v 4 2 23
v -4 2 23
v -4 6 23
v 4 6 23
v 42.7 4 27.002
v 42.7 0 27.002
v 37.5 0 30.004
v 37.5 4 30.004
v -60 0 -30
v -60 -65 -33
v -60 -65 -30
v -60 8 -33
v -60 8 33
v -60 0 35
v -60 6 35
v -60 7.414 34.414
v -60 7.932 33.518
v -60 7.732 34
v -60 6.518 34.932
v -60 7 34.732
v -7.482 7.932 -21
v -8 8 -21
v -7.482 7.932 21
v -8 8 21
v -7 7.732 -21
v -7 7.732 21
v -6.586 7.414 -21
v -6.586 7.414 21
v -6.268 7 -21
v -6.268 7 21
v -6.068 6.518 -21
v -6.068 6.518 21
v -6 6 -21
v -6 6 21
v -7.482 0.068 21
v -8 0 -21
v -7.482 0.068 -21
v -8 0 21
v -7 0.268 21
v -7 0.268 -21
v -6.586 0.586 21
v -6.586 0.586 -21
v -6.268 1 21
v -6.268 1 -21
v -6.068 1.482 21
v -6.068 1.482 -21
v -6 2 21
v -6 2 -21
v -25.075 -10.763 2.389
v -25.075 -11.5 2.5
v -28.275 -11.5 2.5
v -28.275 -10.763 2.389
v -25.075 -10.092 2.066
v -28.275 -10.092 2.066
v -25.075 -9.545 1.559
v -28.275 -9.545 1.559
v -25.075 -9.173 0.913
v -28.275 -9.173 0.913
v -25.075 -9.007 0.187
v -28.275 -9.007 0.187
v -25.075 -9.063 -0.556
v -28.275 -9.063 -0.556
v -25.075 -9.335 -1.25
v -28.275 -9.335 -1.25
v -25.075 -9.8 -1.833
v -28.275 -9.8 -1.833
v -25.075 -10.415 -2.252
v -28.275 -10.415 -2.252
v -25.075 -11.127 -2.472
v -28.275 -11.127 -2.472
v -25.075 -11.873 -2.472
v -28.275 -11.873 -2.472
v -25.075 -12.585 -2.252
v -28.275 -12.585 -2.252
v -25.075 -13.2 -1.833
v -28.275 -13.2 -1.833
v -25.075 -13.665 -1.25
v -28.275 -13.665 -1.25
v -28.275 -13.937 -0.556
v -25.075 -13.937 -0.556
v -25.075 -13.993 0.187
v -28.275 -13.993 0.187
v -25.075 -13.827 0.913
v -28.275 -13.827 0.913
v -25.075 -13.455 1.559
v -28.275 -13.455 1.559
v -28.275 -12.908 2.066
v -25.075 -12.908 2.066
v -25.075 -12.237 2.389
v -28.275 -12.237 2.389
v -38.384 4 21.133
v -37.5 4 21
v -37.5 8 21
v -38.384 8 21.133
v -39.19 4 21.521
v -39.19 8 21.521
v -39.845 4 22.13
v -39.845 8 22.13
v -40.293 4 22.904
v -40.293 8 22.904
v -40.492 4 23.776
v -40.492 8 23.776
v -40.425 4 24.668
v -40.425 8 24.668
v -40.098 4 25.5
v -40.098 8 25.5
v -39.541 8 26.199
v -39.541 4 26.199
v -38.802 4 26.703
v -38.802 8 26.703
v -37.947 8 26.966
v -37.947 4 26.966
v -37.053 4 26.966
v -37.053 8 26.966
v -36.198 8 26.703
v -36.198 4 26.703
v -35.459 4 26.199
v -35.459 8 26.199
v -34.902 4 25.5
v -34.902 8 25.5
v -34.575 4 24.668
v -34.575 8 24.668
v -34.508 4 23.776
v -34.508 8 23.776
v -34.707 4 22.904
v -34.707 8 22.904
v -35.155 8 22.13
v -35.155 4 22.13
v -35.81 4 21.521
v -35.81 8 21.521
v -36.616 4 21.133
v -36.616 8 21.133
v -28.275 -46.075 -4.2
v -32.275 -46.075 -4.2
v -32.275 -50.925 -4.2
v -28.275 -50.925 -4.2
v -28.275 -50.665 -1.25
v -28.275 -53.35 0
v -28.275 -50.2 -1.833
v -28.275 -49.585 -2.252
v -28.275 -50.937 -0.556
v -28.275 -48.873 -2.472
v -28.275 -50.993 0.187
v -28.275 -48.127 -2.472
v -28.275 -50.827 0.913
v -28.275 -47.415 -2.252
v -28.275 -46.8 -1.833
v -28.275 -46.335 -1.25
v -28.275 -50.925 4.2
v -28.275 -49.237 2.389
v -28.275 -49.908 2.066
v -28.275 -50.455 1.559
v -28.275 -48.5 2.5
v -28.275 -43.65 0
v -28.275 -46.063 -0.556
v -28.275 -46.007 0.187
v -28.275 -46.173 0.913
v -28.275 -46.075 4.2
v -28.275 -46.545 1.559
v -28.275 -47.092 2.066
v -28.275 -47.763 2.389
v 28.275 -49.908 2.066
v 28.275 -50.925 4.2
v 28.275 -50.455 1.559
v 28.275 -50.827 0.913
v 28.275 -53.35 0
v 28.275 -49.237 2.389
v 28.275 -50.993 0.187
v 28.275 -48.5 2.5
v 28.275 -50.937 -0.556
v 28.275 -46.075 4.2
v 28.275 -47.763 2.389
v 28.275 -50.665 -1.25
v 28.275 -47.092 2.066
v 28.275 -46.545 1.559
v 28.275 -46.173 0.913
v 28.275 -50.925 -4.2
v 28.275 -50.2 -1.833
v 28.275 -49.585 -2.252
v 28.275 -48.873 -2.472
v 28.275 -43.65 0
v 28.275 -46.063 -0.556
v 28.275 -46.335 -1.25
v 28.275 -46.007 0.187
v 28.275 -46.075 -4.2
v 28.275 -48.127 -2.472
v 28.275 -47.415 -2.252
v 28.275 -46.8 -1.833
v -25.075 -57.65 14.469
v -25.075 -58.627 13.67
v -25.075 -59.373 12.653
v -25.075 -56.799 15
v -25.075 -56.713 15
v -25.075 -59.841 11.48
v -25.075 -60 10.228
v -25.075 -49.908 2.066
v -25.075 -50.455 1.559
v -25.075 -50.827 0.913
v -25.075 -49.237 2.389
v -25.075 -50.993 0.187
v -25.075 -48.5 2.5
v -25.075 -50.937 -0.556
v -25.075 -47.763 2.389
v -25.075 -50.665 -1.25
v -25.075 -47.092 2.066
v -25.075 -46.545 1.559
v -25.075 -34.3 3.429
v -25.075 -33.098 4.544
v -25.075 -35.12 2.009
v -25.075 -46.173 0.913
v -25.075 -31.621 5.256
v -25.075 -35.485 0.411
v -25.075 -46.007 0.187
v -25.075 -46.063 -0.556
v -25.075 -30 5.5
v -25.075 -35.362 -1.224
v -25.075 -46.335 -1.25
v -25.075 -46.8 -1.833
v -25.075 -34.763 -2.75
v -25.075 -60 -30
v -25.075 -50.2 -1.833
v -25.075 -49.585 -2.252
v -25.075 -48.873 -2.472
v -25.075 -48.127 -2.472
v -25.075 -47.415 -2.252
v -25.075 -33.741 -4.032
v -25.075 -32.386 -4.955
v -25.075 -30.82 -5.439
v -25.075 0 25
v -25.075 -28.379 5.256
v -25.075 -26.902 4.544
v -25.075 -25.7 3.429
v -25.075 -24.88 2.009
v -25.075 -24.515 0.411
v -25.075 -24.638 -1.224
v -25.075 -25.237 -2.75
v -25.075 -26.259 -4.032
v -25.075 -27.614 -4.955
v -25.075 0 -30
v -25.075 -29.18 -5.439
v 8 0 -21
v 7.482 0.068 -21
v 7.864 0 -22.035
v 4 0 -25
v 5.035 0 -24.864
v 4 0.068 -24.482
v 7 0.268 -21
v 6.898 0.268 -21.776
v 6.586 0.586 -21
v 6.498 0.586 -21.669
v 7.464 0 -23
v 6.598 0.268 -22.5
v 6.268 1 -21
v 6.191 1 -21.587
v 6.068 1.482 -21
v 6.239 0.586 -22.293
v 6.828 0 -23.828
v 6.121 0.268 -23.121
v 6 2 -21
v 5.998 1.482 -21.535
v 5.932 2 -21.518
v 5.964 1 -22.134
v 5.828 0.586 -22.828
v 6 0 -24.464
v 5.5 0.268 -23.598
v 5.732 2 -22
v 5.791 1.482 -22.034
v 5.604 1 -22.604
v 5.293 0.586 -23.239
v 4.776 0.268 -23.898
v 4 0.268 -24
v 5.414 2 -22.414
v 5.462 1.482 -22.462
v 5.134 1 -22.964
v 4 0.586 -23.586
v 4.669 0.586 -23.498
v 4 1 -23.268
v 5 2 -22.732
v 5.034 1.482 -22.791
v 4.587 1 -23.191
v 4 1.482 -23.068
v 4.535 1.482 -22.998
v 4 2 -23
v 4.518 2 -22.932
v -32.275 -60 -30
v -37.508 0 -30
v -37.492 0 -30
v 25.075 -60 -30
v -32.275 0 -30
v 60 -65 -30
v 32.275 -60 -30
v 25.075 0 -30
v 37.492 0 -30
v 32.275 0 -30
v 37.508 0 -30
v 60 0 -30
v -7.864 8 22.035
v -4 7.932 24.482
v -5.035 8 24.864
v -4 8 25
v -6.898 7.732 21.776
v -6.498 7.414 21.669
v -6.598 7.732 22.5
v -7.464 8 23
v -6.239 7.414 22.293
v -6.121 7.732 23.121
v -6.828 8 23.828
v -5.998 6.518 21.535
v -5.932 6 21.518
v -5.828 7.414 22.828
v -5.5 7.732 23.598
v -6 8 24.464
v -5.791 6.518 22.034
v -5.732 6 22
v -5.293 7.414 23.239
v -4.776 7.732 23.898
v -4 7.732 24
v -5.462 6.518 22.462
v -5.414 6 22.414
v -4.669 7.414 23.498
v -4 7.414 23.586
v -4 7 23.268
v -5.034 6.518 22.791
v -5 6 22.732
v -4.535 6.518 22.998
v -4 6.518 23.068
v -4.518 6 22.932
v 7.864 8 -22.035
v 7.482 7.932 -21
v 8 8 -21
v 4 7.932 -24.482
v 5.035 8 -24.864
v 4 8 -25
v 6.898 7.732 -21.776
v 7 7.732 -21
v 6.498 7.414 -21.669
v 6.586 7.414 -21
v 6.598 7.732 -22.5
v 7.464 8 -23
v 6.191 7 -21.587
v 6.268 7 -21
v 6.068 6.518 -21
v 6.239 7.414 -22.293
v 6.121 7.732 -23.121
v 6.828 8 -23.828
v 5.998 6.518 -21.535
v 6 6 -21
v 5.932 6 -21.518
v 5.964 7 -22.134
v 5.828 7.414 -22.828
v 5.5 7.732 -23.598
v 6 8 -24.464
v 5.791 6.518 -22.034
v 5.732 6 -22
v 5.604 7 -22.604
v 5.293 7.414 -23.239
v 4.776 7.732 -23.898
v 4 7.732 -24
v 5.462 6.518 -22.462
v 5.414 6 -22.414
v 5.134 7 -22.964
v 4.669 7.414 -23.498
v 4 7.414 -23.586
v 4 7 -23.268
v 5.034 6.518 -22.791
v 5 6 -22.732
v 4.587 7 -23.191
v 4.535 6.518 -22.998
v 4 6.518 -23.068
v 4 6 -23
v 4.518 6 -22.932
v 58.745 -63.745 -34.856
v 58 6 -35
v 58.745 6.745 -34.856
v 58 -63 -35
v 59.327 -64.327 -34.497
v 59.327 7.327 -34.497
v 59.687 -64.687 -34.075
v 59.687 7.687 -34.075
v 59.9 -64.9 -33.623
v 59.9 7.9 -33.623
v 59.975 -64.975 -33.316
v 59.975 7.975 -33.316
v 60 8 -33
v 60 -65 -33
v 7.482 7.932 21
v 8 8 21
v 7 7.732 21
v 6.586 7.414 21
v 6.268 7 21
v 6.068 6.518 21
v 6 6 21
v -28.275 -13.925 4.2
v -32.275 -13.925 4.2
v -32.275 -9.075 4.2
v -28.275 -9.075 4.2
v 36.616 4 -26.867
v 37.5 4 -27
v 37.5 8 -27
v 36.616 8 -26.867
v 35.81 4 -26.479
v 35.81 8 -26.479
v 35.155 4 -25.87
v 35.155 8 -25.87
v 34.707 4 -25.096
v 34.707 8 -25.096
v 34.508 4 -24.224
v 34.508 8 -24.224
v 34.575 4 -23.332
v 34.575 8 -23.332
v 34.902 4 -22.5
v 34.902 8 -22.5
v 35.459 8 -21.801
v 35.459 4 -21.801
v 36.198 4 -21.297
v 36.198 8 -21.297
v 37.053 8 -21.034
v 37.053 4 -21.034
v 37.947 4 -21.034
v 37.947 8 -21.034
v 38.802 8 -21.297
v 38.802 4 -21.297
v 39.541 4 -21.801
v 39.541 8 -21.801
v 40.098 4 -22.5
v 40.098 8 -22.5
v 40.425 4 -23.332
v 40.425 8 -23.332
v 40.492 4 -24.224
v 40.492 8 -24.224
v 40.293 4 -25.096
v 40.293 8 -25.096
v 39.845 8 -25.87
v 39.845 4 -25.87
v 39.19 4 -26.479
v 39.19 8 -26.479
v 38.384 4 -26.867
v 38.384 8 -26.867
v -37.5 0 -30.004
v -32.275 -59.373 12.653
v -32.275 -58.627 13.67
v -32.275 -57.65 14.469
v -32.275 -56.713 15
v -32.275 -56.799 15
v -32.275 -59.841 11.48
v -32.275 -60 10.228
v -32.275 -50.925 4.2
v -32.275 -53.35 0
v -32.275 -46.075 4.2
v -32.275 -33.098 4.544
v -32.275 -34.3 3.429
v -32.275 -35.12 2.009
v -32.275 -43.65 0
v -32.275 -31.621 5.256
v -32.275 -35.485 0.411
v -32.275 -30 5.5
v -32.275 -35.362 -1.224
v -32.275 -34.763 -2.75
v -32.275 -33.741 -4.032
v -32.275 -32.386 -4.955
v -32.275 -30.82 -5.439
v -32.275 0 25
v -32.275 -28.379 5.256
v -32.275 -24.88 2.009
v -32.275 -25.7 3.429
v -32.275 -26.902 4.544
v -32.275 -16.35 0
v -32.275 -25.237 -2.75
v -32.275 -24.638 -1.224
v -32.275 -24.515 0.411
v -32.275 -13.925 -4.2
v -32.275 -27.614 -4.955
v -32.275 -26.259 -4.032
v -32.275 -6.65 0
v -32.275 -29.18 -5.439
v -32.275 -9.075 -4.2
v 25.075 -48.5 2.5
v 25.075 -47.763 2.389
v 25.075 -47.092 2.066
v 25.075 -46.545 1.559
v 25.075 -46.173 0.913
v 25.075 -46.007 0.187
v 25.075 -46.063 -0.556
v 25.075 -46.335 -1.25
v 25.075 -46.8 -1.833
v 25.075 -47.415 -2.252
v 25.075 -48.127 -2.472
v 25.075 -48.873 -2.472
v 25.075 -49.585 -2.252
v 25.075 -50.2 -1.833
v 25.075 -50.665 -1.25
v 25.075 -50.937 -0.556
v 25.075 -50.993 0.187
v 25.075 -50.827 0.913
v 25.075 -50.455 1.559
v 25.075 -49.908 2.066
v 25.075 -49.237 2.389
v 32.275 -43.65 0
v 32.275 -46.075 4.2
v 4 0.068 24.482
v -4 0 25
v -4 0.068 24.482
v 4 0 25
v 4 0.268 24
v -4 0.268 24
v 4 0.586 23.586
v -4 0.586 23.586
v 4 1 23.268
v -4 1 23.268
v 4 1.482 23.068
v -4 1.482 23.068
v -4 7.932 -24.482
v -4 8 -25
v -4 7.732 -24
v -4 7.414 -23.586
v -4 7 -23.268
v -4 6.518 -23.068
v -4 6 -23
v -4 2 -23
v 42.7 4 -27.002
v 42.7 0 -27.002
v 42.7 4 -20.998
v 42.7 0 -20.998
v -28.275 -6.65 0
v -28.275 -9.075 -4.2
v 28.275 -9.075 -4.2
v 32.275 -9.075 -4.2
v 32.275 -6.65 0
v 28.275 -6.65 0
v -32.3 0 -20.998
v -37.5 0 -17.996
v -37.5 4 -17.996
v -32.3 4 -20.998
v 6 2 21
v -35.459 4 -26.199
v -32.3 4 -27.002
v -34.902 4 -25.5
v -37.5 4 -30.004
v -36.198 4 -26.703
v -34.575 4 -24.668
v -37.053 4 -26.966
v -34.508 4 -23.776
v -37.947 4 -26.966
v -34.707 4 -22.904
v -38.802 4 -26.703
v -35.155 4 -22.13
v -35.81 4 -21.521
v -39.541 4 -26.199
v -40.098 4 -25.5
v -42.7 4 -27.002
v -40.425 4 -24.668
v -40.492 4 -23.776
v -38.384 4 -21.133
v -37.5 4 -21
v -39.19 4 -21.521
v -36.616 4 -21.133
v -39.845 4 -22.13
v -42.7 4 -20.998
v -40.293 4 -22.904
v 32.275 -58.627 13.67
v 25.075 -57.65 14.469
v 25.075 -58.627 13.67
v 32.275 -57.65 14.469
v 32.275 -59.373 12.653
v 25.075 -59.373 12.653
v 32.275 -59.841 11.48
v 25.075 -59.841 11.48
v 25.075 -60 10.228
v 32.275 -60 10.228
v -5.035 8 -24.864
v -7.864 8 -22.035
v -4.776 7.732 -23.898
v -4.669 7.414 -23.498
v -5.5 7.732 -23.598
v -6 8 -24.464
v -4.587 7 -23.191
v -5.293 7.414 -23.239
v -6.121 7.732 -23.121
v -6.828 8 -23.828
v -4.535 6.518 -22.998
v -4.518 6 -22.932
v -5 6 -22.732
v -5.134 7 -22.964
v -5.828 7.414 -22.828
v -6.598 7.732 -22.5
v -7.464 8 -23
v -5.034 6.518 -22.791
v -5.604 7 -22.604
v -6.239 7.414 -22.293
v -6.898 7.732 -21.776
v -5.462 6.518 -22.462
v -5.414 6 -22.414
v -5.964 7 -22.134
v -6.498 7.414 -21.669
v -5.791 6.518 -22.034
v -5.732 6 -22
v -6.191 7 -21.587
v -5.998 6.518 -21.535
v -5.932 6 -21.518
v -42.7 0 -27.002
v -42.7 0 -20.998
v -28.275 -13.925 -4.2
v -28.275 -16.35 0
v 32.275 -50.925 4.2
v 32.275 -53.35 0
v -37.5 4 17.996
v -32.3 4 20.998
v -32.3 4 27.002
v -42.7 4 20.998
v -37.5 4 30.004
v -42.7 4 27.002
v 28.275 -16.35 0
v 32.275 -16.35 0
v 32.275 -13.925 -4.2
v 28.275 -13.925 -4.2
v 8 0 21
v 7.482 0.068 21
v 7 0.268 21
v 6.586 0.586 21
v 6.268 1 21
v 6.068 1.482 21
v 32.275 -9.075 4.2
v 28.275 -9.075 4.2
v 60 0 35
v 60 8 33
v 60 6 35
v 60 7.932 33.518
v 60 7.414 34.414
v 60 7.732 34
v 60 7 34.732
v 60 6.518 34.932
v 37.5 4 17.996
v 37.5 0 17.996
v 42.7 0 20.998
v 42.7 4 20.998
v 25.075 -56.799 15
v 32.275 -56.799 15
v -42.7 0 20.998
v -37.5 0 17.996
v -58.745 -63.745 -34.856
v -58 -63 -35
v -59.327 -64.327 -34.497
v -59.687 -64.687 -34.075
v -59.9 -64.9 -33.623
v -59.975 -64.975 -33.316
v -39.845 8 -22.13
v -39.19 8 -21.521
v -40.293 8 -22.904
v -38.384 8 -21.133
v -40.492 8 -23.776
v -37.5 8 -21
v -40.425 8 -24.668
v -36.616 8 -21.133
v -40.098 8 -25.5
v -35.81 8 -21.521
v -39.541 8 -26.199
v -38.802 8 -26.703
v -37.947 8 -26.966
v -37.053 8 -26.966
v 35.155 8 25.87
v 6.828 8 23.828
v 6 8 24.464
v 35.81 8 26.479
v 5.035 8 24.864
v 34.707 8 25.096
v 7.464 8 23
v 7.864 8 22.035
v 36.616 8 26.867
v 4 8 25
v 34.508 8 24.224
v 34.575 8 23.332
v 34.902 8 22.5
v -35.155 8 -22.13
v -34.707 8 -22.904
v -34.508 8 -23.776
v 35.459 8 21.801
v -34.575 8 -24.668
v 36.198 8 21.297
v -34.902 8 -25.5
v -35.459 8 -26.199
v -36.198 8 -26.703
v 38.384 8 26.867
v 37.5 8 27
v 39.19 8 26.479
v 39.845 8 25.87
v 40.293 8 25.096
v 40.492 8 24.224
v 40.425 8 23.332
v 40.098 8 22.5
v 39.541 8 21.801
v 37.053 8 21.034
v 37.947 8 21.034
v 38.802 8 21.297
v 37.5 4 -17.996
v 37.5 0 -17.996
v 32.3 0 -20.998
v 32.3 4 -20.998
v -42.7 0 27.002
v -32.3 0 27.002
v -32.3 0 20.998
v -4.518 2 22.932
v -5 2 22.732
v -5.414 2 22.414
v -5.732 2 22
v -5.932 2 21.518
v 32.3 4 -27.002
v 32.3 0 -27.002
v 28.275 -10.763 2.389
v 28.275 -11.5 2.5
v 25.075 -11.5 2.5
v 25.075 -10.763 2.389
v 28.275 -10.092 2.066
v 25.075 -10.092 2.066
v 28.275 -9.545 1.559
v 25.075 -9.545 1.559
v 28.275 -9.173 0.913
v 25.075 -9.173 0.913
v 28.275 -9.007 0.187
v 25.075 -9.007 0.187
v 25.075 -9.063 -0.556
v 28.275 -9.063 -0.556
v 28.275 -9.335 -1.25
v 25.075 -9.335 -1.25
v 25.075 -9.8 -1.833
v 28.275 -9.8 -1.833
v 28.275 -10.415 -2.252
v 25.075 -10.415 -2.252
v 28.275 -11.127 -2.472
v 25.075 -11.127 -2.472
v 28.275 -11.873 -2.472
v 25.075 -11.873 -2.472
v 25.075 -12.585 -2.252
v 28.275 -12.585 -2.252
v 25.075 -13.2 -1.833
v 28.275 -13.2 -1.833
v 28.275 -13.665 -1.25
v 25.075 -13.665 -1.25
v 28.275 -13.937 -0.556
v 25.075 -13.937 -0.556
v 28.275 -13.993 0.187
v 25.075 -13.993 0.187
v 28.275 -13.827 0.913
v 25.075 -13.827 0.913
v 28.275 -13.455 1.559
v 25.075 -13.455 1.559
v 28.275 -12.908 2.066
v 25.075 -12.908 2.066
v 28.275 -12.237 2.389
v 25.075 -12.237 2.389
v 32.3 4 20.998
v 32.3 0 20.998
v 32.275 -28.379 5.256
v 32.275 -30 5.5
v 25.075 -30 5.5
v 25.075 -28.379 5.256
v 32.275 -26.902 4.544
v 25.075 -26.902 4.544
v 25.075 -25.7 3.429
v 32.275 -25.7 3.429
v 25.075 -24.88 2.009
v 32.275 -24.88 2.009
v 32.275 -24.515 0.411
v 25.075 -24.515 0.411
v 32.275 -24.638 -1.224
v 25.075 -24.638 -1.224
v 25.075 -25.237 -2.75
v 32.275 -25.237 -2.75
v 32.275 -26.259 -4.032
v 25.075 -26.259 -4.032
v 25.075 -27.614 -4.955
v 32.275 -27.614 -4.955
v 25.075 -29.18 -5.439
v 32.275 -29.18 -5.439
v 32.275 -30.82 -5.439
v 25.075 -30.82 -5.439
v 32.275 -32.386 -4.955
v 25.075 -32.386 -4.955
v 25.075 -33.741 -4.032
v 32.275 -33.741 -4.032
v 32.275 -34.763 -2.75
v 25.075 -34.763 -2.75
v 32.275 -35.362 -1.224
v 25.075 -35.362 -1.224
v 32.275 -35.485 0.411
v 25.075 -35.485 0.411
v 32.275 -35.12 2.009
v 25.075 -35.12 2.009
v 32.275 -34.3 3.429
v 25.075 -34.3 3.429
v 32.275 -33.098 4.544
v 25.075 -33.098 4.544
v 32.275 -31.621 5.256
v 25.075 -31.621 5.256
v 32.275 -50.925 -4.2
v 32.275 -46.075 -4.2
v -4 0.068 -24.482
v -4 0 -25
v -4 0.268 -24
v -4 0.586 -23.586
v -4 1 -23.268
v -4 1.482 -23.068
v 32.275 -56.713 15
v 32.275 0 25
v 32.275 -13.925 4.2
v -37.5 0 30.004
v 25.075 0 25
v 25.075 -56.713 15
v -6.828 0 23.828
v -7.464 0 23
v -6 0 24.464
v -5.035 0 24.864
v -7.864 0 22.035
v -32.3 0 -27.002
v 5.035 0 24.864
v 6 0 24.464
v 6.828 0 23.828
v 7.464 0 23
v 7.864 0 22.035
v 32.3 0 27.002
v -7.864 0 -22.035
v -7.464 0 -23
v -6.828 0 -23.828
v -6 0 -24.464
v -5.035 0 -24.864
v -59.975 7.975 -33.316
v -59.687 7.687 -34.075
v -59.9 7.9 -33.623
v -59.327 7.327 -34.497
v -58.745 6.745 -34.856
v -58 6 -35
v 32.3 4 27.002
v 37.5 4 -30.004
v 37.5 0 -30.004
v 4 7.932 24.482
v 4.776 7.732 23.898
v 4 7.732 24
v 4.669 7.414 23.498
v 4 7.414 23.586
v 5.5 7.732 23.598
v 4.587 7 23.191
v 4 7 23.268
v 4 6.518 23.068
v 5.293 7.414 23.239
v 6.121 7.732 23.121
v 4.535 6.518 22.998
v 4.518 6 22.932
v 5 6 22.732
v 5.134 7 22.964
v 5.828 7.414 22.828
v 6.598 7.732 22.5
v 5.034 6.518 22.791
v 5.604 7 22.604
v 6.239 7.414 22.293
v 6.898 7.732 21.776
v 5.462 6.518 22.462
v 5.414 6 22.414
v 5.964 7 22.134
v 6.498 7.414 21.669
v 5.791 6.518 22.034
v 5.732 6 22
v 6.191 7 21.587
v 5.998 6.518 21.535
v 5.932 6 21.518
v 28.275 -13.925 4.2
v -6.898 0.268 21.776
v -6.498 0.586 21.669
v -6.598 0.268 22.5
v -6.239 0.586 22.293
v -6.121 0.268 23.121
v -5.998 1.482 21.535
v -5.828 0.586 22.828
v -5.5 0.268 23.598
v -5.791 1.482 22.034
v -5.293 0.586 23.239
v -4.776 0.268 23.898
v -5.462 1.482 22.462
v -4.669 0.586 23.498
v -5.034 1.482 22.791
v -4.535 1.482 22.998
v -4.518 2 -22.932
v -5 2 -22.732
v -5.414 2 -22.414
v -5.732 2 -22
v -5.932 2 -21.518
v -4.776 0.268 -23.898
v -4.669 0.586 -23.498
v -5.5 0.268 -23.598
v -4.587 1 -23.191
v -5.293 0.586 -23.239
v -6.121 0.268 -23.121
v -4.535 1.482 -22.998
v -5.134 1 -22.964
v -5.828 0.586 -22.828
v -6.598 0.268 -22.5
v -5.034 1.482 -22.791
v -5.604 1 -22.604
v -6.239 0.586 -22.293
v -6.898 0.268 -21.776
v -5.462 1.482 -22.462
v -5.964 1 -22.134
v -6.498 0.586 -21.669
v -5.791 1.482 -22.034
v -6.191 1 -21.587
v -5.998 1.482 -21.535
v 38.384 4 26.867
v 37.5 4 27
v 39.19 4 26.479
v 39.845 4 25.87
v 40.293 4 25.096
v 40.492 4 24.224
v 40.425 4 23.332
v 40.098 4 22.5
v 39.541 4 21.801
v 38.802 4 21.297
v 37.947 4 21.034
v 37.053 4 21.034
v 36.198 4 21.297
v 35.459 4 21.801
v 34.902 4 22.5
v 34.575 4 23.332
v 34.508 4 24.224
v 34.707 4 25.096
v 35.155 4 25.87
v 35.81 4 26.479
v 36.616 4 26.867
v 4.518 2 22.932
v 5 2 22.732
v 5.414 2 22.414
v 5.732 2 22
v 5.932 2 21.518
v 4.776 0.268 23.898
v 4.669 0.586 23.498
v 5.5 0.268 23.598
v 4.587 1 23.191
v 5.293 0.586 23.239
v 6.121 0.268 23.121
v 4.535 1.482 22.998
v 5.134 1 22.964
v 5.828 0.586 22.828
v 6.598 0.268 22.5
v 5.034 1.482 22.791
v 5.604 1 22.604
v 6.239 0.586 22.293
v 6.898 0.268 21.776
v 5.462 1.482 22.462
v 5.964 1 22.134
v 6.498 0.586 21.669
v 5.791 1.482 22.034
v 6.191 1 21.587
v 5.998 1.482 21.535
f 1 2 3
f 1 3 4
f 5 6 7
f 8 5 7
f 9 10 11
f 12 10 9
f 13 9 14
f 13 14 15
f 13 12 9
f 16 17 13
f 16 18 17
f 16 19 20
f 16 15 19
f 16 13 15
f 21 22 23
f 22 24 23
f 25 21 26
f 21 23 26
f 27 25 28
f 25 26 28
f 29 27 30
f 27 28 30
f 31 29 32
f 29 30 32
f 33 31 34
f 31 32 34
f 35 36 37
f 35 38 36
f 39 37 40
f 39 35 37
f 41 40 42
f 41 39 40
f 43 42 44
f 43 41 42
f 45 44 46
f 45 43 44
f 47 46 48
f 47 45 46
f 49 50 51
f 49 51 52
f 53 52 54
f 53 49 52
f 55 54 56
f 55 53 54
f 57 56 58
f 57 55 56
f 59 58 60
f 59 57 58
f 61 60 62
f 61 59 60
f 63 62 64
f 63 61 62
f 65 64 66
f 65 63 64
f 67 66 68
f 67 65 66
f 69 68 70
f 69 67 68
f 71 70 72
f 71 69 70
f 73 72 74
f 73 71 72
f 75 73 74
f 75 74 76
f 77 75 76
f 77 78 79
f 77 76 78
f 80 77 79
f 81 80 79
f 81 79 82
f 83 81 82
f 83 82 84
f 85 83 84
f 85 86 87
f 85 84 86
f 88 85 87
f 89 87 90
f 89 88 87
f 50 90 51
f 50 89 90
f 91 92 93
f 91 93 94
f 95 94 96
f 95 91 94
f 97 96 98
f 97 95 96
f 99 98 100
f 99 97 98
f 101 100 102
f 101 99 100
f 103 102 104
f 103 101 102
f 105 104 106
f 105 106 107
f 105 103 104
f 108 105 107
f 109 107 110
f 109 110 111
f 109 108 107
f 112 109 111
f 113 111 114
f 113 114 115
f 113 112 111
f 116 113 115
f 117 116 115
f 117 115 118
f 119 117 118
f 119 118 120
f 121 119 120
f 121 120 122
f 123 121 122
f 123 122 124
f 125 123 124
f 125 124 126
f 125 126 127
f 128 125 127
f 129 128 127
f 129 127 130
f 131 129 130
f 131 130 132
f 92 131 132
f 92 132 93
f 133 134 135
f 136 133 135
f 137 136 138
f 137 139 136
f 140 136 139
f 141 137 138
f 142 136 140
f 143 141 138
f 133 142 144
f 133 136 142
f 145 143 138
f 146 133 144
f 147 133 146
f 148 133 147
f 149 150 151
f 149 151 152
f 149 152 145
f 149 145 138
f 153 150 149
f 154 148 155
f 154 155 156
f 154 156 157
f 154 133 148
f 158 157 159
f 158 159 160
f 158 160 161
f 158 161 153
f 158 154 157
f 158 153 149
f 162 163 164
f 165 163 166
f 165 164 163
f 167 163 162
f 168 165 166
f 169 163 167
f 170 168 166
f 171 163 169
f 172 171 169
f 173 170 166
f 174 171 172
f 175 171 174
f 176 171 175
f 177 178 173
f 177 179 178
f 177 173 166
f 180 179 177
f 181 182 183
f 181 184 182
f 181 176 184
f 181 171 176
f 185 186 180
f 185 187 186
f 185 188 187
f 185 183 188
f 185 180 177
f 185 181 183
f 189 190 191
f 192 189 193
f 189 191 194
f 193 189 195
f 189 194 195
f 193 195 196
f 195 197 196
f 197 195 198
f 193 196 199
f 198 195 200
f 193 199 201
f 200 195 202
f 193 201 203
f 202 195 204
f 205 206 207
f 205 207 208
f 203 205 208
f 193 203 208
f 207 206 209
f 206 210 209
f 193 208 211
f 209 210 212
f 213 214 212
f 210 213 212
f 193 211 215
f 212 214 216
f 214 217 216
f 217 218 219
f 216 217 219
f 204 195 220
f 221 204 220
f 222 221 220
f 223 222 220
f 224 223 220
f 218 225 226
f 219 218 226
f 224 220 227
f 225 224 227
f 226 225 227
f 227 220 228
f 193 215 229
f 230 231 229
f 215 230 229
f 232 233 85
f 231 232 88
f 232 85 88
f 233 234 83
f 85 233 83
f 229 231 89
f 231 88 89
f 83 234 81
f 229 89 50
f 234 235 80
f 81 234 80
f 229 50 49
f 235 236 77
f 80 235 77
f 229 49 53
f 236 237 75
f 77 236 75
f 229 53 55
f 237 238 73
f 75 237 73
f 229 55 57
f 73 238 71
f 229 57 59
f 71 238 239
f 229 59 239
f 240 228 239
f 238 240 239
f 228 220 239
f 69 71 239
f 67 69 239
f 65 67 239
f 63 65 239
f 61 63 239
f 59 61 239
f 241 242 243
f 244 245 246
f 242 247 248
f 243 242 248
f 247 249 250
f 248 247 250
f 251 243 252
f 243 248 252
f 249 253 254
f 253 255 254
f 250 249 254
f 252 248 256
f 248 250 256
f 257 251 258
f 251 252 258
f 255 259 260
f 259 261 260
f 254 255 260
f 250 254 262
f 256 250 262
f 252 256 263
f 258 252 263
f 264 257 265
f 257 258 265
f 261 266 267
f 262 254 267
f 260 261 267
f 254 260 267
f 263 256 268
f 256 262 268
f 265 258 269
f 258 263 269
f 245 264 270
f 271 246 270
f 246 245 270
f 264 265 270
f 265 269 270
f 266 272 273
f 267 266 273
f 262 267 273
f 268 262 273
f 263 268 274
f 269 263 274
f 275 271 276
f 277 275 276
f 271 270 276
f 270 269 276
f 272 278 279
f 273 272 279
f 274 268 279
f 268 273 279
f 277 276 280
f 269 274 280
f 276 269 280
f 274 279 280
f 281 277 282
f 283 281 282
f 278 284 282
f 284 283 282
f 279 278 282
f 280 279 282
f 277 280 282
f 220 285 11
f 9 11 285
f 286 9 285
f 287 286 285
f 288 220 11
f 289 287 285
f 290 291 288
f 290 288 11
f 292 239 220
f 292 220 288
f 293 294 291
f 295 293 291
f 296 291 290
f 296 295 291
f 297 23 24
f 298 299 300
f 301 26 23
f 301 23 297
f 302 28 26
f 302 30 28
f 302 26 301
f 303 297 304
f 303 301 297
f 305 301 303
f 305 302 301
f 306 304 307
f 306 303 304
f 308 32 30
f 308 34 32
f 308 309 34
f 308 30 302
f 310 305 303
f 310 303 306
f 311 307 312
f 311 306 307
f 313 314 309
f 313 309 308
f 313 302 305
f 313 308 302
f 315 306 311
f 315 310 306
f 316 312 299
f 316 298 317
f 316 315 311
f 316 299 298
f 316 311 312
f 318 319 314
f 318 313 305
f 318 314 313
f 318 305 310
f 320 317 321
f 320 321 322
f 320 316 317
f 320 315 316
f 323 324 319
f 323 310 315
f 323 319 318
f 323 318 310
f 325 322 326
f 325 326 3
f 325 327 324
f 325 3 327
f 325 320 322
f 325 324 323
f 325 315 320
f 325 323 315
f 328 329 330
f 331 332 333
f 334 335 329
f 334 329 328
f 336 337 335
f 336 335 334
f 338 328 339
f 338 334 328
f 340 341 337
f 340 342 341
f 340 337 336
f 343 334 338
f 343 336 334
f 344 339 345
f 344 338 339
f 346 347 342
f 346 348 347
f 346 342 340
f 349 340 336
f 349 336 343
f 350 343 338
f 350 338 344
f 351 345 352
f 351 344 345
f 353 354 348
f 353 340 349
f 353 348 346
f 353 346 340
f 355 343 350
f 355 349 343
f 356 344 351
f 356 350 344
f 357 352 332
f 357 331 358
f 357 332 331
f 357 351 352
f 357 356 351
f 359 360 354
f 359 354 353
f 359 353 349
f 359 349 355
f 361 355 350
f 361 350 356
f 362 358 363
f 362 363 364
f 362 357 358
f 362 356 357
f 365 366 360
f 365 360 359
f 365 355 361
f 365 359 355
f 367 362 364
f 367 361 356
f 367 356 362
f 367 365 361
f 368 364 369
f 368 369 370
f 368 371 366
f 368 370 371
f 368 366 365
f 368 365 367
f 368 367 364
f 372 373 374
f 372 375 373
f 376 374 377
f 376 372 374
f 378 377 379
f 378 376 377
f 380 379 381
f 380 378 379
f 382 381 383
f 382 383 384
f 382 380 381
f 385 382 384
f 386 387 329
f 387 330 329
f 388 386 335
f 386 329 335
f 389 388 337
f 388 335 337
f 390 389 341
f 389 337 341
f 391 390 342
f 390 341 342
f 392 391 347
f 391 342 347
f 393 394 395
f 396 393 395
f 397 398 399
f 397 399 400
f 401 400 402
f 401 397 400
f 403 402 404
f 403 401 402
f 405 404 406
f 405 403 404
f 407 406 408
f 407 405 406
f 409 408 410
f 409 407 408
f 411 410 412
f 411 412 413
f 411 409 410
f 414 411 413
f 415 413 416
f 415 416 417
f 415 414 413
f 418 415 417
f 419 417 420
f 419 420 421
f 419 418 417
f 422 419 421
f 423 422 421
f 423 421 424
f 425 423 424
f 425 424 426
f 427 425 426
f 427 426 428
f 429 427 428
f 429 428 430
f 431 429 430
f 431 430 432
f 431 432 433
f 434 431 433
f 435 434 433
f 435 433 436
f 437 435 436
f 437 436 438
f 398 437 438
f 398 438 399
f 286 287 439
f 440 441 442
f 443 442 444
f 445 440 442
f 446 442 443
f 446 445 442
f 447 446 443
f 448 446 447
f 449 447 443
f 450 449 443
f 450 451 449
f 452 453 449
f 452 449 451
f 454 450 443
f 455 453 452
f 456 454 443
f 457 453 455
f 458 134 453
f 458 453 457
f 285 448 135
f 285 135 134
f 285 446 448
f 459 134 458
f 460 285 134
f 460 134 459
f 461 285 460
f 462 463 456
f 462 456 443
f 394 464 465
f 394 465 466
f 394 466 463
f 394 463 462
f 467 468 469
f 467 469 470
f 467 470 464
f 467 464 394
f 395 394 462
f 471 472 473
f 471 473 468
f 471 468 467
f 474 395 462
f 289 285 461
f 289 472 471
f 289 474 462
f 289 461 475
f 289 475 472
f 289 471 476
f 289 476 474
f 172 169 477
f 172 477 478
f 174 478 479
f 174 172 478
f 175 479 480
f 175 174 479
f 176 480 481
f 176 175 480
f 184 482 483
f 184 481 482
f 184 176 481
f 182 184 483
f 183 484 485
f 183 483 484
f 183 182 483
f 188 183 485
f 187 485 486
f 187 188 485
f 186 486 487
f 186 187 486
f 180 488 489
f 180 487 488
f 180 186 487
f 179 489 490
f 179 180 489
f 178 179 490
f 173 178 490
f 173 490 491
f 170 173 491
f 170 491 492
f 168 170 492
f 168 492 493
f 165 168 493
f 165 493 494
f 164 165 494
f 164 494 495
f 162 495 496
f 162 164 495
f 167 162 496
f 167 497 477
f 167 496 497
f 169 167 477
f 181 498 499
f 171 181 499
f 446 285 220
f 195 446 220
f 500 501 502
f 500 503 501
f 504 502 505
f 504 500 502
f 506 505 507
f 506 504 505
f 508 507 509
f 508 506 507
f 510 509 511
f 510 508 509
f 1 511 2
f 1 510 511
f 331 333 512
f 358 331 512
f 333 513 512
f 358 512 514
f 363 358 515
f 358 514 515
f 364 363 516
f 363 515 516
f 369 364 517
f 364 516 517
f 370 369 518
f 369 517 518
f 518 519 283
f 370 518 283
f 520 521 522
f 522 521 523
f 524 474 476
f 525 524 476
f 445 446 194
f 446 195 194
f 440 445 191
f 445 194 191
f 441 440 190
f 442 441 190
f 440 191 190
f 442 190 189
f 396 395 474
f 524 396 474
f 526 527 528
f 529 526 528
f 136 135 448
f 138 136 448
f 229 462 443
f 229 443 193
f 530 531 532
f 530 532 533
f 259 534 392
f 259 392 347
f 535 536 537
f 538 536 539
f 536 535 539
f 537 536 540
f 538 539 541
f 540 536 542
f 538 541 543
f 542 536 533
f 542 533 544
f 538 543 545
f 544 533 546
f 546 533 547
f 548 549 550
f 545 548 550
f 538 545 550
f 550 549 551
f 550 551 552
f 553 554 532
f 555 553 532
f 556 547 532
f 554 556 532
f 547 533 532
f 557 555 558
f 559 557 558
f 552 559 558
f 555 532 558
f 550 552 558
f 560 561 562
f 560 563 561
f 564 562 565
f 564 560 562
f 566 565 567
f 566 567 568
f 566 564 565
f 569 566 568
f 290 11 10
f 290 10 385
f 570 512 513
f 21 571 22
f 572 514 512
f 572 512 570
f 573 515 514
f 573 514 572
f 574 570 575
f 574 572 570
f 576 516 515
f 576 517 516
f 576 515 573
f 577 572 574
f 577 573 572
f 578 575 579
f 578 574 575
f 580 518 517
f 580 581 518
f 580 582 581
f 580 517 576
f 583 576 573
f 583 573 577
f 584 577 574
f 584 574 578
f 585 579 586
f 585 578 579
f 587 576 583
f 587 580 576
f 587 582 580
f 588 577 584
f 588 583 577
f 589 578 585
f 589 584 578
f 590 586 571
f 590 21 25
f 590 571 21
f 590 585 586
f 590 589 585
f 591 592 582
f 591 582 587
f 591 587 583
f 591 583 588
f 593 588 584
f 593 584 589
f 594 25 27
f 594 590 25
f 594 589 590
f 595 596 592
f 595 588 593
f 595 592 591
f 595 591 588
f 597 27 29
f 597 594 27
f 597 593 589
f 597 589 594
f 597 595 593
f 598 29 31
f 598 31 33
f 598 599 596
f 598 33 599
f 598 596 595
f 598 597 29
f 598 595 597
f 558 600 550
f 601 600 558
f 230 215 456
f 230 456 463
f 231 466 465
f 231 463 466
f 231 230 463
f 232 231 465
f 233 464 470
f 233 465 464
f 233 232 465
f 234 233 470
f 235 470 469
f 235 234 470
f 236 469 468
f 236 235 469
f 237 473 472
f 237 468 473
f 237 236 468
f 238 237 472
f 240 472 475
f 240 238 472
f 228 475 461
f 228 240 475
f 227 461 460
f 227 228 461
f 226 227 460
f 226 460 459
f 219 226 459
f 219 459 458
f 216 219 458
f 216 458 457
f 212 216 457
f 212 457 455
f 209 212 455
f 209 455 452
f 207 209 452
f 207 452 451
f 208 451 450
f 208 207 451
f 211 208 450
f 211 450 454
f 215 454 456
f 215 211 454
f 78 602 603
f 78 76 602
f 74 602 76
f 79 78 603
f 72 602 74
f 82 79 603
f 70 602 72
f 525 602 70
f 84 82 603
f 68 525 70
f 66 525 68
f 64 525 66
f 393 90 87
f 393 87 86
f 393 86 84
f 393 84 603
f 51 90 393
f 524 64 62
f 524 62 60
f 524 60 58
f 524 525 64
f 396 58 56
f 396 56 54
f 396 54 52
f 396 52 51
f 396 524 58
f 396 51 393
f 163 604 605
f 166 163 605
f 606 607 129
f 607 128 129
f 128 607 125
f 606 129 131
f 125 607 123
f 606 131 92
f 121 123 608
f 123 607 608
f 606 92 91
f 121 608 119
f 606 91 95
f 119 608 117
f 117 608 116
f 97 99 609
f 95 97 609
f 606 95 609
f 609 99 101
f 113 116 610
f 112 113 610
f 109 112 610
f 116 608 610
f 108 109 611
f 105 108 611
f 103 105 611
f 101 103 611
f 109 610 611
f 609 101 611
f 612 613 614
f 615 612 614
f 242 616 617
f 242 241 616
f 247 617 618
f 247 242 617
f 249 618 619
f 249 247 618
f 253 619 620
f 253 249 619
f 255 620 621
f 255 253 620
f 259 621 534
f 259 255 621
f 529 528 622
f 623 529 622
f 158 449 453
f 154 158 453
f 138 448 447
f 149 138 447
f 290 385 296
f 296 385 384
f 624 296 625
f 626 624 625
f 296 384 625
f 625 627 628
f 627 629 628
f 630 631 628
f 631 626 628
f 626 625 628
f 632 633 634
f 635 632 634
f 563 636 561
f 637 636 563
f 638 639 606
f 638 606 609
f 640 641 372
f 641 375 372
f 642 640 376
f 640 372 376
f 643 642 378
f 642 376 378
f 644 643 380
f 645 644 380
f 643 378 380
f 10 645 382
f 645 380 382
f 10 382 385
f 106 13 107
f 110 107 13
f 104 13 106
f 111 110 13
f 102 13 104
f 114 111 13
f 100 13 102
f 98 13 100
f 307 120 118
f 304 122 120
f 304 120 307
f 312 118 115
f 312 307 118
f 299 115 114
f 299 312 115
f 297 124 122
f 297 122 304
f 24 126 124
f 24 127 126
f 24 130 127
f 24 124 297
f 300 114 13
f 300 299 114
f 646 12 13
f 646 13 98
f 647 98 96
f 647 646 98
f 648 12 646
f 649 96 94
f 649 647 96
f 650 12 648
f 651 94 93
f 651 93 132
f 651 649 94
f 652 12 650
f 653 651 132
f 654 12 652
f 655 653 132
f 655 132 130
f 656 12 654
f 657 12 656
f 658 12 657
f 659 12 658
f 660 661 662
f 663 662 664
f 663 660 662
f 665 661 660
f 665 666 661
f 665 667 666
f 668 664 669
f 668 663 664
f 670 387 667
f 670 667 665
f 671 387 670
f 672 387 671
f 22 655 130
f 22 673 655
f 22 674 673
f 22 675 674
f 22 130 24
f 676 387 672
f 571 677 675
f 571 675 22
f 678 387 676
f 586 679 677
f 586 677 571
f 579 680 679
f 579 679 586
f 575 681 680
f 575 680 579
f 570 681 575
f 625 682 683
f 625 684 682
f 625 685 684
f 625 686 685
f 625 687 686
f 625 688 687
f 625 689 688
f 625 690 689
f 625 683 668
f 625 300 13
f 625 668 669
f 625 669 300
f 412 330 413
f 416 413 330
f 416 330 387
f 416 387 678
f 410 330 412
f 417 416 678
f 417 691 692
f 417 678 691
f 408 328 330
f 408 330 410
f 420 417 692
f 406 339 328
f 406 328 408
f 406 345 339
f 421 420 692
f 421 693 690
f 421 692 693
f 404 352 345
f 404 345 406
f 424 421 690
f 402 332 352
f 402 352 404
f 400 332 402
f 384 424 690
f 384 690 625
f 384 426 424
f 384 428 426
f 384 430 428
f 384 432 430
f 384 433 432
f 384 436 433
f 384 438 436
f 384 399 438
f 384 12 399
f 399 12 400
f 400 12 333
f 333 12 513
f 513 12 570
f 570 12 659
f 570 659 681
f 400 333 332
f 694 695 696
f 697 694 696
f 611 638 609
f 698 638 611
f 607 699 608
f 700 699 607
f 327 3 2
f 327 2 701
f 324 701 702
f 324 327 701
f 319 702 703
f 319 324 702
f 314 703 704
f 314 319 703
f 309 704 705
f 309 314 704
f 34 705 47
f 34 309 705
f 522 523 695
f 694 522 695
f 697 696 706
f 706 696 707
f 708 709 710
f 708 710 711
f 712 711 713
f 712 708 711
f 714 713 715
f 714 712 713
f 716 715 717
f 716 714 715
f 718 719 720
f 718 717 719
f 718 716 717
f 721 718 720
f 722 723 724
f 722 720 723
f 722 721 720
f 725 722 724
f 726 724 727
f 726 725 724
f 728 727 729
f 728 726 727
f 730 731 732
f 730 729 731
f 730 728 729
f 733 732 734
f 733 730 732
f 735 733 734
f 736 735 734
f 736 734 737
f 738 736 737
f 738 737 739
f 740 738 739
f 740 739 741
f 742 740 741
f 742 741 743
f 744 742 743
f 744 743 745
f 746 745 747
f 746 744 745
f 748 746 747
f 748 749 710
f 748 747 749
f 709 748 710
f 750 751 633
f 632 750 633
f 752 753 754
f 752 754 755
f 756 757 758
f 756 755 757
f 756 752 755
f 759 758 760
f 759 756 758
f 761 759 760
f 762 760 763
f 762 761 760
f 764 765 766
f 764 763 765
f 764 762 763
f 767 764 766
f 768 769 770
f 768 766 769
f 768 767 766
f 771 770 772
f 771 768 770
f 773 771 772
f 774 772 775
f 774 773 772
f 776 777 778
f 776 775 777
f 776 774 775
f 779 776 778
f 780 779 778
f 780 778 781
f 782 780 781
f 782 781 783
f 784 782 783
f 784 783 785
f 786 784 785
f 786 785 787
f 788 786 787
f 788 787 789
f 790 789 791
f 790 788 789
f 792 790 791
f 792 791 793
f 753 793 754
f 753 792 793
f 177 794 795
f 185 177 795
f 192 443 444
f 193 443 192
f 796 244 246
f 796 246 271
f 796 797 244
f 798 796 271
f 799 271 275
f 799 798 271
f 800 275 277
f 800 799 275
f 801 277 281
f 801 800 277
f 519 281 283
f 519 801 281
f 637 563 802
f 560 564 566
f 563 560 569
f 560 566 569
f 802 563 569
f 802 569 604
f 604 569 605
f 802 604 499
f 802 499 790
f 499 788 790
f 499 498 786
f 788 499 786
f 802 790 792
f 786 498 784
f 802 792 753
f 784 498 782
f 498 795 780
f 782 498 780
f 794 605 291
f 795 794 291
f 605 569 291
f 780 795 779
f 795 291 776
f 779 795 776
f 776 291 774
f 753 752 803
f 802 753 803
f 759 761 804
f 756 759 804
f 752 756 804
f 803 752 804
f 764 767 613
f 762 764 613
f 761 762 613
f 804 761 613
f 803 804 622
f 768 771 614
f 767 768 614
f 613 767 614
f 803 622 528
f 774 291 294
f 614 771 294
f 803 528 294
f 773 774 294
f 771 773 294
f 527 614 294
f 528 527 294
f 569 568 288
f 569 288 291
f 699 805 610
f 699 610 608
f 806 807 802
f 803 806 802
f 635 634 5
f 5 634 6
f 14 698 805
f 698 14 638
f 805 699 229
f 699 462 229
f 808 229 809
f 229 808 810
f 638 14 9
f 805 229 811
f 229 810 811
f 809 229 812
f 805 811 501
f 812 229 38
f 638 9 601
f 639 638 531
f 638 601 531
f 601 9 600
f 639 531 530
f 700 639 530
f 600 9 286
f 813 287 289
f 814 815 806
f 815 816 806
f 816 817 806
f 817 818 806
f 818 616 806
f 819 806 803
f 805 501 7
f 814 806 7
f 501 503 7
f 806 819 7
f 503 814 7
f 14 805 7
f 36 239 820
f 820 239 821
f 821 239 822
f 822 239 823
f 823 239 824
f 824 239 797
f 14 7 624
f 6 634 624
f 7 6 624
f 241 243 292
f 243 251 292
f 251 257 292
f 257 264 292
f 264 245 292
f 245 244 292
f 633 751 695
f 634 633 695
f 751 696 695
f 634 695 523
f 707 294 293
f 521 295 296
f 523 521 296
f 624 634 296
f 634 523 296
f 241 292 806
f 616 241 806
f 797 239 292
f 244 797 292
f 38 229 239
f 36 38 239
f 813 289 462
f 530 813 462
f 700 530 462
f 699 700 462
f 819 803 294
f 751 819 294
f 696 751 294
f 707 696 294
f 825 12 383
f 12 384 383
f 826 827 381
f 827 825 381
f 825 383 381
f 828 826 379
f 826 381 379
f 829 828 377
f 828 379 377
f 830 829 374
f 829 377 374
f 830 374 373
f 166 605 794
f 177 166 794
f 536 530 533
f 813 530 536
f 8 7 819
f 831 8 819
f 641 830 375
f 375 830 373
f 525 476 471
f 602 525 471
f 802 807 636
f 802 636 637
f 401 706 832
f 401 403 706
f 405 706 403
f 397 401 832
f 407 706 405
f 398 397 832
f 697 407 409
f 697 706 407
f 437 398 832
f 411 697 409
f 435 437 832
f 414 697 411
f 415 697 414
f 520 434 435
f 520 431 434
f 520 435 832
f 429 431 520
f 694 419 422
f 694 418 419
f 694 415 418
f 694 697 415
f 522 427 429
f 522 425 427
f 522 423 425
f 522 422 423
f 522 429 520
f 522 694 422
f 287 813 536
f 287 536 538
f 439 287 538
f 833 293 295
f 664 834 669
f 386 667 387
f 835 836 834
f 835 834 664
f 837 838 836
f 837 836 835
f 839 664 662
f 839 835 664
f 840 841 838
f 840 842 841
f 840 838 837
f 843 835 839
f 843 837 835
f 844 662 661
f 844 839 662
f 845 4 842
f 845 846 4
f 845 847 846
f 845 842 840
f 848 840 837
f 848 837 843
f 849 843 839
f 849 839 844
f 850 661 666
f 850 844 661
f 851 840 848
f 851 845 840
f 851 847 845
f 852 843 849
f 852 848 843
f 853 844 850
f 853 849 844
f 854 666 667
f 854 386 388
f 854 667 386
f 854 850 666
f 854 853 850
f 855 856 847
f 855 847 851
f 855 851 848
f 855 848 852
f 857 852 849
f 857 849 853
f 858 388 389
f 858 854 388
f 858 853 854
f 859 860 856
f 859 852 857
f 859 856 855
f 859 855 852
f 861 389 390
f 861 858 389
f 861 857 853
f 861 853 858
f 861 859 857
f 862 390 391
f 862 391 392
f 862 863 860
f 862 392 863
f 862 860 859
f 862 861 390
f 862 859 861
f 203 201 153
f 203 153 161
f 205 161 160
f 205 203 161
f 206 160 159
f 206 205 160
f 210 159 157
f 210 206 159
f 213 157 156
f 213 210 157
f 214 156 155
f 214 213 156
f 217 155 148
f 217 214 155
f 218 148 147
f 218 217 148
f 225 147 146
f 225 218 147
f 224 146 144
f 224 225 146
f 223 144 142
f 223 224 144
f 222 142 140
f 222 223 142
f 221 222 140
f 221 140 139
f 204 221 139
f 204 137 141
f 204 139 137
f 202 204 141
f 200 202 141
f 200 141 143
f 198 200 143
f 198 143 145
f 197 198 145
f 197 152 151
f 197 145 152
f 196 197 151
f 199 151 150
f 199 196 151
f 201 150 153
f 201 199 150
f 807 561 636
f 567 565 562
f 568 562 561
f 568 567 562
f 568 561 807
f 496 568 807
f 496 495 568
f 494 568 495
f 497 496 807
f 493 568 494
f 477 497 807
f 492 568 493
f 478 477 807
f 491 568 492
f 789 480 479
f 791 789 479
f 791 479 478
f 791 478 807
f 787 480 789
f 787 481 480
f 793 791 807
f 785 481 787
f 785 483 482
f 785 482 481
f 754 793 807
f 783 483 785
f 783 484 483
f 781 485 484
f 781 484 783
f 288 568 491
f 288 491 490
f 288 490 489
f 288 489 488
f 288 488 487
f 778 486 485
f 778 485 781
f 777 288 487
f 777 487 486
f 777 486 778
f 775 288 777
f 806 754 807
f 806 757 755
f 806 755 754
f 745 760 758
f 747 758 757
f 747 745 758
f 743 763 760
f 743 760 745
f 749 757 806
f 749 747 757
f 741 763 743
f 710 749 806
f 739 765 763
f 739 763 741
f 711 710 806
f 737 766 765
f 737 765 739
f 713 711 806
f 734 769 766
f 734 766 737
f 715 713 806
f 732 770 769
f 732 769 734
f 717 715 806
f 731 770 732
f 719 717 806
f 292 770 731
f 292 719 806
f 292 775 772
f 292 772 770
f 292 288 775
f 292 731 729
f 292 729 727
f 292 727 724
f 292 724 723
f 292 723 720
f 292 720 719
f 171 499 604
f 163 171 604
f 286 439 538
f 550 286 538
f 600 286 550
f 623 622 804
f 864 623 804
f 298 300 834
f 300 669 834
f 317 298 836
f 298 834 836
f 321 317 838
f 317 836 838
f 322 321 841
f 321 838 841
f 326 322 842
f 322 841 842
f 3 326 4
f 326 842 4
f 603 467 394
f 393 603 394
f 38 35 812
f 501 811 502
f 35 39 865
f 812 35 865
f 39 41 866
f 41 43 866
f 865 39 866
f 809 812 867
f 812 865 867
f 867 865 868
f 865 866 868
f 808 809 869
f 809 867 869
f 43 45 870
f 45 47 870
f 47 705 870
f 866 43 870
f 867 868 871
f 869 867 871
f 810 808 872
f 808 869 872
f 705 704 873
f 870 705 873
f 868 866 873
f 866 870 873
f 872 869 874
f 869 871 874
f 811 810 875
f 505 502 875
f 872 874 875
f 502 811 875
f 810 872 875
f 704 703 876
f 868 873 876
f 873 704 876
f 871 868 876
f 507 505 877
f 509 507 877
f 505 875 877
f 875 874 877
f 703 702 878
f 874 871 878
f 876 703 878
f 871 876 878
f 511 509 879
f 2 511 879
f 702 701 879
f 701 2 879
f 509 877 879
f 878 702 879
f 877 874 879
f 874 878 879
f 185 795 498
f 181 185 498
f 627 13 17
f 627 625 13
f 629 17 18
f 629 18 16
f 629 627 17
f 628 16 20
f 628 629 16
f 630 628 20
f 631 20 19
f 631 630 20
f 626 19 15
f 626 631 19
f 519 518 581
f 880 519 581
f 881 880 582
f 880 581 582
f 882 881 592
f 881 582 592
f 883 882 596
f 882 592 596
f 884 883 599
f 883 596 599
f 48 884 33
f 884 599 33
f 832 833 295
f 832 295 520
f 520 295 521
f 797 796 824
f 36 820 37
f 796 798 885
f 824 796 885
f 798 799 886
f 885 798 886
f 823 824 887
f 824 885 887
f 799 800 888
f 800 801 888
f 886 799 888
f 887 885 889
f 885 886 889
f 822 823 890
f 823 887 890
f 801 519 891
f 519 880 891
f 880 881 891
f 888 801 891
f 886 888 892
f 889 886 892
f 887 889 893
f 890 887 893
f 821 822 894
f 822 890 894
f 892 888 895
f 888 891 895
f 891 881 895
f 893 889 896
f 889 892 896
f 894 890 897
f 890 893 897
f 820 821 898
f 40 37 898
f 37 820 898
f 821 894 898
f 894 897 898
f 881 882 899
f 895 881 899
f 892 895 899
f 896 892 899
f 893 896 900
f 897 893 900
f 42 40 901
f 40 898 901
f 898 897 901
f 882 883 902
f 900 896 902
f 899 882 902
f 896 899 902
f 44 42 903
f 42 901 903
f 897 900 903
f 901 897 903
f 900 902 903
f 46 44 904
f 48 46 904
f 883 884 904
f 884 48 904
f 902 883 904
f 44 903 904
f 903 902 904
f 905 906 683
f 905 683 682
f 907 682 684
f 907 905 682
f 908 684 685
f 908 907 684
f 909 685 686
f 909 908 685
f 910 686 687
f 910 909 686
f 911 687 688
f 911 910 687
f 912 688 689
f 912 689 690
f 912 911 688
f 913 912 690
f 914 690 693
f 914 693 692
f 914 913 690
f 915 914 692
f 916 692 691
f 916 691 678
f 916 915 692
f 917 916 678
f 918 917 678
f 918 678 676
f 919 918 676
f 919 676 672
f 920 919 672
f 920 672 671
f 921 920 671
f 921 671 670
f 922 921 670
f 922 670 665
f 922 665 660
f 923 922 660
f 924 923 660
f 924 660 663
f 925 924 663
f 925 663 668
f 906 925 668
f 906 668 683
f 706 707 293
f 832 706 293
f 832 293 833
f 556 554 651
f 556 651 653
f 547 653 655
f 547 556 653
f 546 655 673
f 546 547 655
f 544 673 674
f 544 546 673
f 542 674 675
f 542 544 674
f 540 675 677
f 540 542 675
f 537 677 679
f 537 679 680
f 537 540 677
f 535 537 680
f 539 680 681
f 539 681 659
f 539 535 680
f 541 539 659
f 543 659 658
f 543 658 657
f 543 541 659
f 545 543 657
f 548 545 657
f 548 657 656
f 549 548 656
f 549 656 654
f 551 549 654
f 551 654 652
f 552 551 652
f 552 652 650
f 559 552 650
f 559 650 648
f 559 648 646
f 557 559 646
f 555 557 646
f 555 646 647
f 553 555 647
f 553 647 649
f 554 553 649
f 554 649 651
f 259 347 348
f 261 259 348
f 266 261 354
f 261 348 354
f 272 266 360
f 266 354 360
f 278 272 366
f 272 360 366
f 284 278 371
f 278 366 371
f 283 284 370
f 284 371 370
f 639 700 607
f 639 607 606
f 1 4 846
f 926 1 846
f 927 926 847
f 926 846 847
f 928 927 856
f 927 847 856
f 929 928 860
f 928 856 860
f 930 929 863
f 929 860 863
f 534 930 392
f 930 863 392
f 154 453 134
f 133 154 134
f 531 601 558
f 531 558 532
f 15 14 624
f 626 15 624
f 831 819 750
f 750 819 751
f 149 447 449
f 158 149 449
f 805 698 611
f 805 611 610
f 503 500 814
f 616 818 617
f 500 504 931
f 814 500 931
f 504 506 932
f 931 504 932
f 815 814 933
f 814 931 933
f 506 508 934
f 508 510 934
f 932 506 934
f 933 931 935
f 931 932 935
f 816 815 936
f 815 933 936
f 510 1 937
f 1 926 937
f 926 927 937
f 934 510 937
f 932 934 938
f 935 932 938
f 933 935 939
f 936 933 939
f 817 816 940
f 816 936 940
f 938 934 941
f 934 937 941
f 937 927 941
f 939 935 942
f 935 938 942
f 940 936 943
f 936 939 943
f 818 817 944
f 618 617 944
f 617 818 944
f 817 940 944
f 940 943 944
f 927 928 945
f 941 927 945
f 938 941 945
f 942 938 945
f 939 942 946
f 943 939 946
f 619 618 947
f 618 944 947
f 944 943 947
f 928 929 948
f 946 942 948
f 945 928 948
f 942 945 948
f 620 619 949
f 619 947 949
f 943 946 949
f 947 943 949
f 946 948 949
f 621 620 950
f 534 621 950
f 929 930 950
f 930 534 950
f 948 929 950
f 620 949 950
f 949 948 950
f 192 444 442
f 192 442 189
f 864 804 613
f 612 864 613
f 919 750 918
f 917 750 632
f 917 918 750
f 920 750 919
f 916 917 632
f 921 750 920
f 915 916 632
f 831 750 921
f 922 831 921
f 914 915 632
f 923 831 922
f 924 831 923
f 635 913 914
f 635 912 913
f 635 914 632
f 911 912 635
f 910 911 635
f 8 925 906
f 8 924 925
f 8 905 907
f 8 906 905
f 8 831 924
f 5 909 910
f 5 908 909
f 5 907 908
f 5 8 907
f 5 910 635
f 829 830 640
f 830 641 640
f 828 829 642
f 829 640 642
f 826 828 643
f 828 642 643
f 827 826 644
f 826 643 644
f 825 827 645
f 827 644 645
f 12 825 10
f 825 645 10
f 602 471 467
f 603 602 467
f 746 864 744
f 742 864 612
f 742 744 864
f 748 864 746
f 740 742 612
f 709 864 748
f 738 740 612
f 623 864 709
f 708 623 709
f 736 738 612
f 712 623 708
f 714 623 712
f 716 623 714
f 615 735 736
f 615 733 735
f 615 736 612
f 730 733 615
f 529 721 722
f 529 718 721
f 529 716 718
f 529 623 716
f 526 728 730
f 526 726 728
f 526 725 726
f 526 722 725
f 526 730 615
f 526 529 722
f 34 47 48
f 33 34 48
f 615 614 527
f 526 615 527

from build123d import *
from OCP.BRepFilletAPI import BRepFilletAPI_MakeChamfer

# Parameters (mm, degrees)
SKETCH1_W               = 120
SKETCH1_H               = 70
SKETCH1_R               = 3
SKETCH1_W_2             = 12
SKETCH1_H_2             = 46
BOSS_EXTRUDE1_DEPTH     = 8
FILLET1_R               = 2
SKETCH2_W               = 120
SKETCH2_H               = 5
BOSS_EXTRUDE2_DEPTH     = 65
SKETCH3_W               = 7.2
SKETCH3_H               = 60
BOSS_EXTRUDE3_DEPTH     = 45
CUT_EXTRUDE1_DEPTH      = 119.172228654
CUT_EXTRUDE1_DEPTH_BACK = 119.172228654
SKETCH4_R               = 5.5
SKETCH4_R_2             = 2.5
CUT_EXTRUDE2_DEPTH      = 4
CUT_EXTRUDE3_DEPTH      = 4
CUT_EXTRUDE4_DEPTH      = 4
CHAMFER1_SIZE           = 10
CHAMFER1_SIZE2          = 56.712818196
FILLET3_R               = 2
CHAMFER2_SIZE           = 2
CHAMFER2_SIZE2          = 3.200669058
FILLET4_R               = 5


with BuildPart() as part:
    # Sketch1 → Boss-Extrude1 (new body)
    with BuildSketch(Plane(origin=(0, 0, 0), x_dir=(1, 0, 0), z_dir=(0, 1, 0))):
        Rectangle(SKETCH1_W, SKETCH1_H)
        with Locations(Location((-37.5, 24, 0), (0, 0, 270))):
            Circle(SKETCH1_R, mode=Mode.SUBTRACT)
        with Locations(Location((-37.5, -24, 0), (0, 0, 90))):
            Circle(SKETCH1_R, mode=Mode.SUBTRACT)
        with Locations(Location((37.5, 24, 0), (0, 0, 90))):
            Circle(SKETCH1_R, mode=Mode.SUBTRACT)
        with Locations(Location((37.5, -24, 0), (0, 0, 270))):
            Circle(SKETCH1_R, mode=Mode.SUBTRACT)
        Rectangle(SKETCH1_W_2, SKETCH1_H_2, mode=Mode.SUBTRACT)
    extrude(amount=BOSS_EXTRUDE1_DEPTH)

    # Fillet1
    fillet1_edges = [part.edges().sort_by_distance(p)[0] for p in [
        (-6, 4, -23),
        (-6, 4, 23),
        (6, 4, 23),
        (6, 4, -23),
    ]]
    fillet(fillet1_edges, radius=FILLET1_R)

    # Sketch2 → Boss-Extrude2 (add)
    with BuildSketch(Plane.XZ):
        with Locations((0, -32.5)):
            Rectangle(SKETCH2_W, SKETCH2_H)
    extrude(amount=BOSS_EXTRUDE2_DEPTH)

    # Sketch3 → Boss-Extrude3 (add)
    with BuildSketch(Plane.XY.offset(-30)):
        with Locations((-28.675, -30)):
            Rectangle(SKETCH3_W, SKETCH3_H)
        with Locations((28.675, -30)):
            Rectangle(SKETCH3_W, SKETCH3_H)
    extrude(amount=BOSS_EXTRUDE3_DEPTH)

    # Sketch4 → Cut-Extrude1 (cut, two sides: drawn at the far end of the back side and taken through both)
    with BuildSketch(Plane.ZY.offset(32.275).offset(-CUT_EXTRUDE1_DEPTH_BACK)):
        with Locations((0, -30)):
            Circle(SKETCH4_R)
        with Locations((0, -11.5)):
            Circle(SKETCH4_R_2)
        with Locations((0, -48.5)):
            Circle(SKETCH4_R_2)
    extrude(amount=CUT_EXTRUDE1_DEPTH + CUT_EXTRUDE1_DEPTH_BACK, mode=Mode.SUBTRACT)

    # Sketch5 → Cut-Extrude2 (cut)
    with BuildSketch(Plane.ZY.offset(32.275)):
        Polygon((4.2, -9.075128869), (0, -6.650257739), (-4.2, -9.075128869), (-4.2, -13.924871131), (0, -16.349742261), (4.2, -13.924871131), align=None)
        Polygon((4.2, -46.075128869), (0, -43.650257739), (-4.2, -46.075128869), (-4.2, -50.924871131), (0, -53.349742261), (4.2, -50.924871131), align=None)
    extrude(amount=-CUT_EXTRUDE2_DEPTH, mode=Mode.SUBTRACT)

    # Sketch6 → Cut-Extrude3 (cut)
    with BuildSketch(Plane(origin=(32.275, 0, 0), x_dir=(0, 0, -1), z_dir=(1, 0, 0))):
        Polygon((4.2, -13.924871131), (4.2, -9.075128869), (0, -6.650257739), (-4.2, -9.075128869), (-4.2, -13.924871131), (0, -16.349742261), align=None)
        Polygon((-4.2, -46.075128869), (-4.2, -50.924871131), (0, -53.349742261), (4.2, -50.924871131), (4.2, -46.075128869), (0, -43.650257739), align=None)
    extrude(amount=-CUT_EXTRUDE3_DEPTH, mode=Mode.SUBTRACT)

    # Sketch7 → Cut-Extrude4 (cut)
    with BuildSketch(Plane.XZ):
        Polygon((42.7, -20.9977786), (37.5, -17.9955572), (32.3, -20.9977786), (32.3, -27.0022214), (37.5, -30.0044428), (42.7, -27.0022214), align=None)
        Polygon((42.7, 27.0022214), (37.5, 30.0044428), (32.3, 27.0022214), (32.3, 20.9977786), (37.5, 17.9955572), (42.7, 20.9977786), align=None)
        Polygon((-42.7, -27.0022214), (-42.7, -20.9977786), (-37.5, -17.9955572), (-32.3, -20.9977786), (-32.3, -27.0022214), (-37.5, -30.0044428), align=None)
        Polygon((-42.7, 20.9977786), (-42.7, 27.0022214), (-37.5, 30.0044428), (-32.3, 27.0022214), (-32.3, 20.9977786), (-37.5, 17.9955572), align=None)
    extrude(amount=-CUT_EXTRUDE4_DEPTH, mode=Mode.SUBTRACT)

    # Chamfer1
    chamfer1_edges = [part.edges().sort_by_distance(p)[0] for p in [
        (28.675, 0, 15),
        (-28.675, 0, 15),
    ]]
    chamfer1_side = [part.faces().sort_by_distance(p)[0] for p in [
        (-58.635265594, 0, 2.5),
    ]]
    chamfer(chamfer1_edges, length=CHAMFER1_SIZE, length2=CHAMFER1_SIZE2, reference=chamfer1_side[0])

    # Fillet3
    fillet3_edges = [part.edges().sort_by_distance(p)[0] for p in [
        (0, 8, 35),
        (0, 0, 23),
        (0, 8, 23),
        (6, 0, 0),
        (6, 8, 0),
        (-6, 0, 0),
        (-6, 8, 0),
        (0, 0, -23),
        (0, 8, -23),
        (5.414213562, 0, 22.414213562),
        (5.414213562, 8, 22.414213562),
        (-5.414213562, 0, 22.414213562),
        (-5.414213562, 8, 22.414213562),
        (5.414213562, 0, -22.414213562),
        (5.414213562, 8, -22.414213562),
        (-5.414213562, 0, -22.414213562),
        (-5.414213562, 8, -22.414213562),
        (0, -65, -35),
        (-60, -28.5, -35),
        (60, -28.5, -35),
        (0, 8, -35),
    ]]
    fillet(fillet3_edges, radius=FILLET3_R)

    # Chamfer2: one chamfer whose edges measure the first distance from different faces: ONE call of the kernel's chamfer builder (chamfer() names one face for all edges)
    chamfer2_edges_1 = [part.edges().sort_by_distance(p)[0] for p in [
        (28.675, -60, 15),
    ]]
    chamfer2_side_1 = [part.faces().sort_by_distance(p)[0] for p in [
        (28.675, -60, -7.5),
    ]]
    chamfer2_edges_2 = [part.edges().sort_by_distance(p)[0] for p in [
        (-28.675, -60, 15),
    ]]
    chamfer2_side_2 = [part.faces().sort_by_distance(p)[0] for p in [
        (-28.675, -60, -7.5),
    ]]
    chamfer2 = BRepFilletAPI_MakeChamfer(part.part.solid().wrapped)
    for e in chamfer2_edges_1:
        chamfer2.Add(CHAMFER2_SIZE, CHAMFER2_SIZE2, e.wrapped, chamfer2_side_1[0].wrapped)  # the first distance lies on this face
    for e in chamfer2_edges_2:
        chamfer2.Add(CHAMFER2_SIZE, CHAMFER2_SIZE2, e.wrapped, chamfer2_side_2[0].wrapped)  # the first distance lies on this face
    add(Compound.cast(chamfer2.Shape()), mode=Mode.REPLACE)

    # Fillet4
    fillet4_edges = [part.edges().sort_by_distance(p)[0] for p in [
        (28.675, -60, 13),
        (-28.675, -60, 13),
    ]]
    fillet(fillet4_edges, radius=FILLET4_R)


solid = part.part
